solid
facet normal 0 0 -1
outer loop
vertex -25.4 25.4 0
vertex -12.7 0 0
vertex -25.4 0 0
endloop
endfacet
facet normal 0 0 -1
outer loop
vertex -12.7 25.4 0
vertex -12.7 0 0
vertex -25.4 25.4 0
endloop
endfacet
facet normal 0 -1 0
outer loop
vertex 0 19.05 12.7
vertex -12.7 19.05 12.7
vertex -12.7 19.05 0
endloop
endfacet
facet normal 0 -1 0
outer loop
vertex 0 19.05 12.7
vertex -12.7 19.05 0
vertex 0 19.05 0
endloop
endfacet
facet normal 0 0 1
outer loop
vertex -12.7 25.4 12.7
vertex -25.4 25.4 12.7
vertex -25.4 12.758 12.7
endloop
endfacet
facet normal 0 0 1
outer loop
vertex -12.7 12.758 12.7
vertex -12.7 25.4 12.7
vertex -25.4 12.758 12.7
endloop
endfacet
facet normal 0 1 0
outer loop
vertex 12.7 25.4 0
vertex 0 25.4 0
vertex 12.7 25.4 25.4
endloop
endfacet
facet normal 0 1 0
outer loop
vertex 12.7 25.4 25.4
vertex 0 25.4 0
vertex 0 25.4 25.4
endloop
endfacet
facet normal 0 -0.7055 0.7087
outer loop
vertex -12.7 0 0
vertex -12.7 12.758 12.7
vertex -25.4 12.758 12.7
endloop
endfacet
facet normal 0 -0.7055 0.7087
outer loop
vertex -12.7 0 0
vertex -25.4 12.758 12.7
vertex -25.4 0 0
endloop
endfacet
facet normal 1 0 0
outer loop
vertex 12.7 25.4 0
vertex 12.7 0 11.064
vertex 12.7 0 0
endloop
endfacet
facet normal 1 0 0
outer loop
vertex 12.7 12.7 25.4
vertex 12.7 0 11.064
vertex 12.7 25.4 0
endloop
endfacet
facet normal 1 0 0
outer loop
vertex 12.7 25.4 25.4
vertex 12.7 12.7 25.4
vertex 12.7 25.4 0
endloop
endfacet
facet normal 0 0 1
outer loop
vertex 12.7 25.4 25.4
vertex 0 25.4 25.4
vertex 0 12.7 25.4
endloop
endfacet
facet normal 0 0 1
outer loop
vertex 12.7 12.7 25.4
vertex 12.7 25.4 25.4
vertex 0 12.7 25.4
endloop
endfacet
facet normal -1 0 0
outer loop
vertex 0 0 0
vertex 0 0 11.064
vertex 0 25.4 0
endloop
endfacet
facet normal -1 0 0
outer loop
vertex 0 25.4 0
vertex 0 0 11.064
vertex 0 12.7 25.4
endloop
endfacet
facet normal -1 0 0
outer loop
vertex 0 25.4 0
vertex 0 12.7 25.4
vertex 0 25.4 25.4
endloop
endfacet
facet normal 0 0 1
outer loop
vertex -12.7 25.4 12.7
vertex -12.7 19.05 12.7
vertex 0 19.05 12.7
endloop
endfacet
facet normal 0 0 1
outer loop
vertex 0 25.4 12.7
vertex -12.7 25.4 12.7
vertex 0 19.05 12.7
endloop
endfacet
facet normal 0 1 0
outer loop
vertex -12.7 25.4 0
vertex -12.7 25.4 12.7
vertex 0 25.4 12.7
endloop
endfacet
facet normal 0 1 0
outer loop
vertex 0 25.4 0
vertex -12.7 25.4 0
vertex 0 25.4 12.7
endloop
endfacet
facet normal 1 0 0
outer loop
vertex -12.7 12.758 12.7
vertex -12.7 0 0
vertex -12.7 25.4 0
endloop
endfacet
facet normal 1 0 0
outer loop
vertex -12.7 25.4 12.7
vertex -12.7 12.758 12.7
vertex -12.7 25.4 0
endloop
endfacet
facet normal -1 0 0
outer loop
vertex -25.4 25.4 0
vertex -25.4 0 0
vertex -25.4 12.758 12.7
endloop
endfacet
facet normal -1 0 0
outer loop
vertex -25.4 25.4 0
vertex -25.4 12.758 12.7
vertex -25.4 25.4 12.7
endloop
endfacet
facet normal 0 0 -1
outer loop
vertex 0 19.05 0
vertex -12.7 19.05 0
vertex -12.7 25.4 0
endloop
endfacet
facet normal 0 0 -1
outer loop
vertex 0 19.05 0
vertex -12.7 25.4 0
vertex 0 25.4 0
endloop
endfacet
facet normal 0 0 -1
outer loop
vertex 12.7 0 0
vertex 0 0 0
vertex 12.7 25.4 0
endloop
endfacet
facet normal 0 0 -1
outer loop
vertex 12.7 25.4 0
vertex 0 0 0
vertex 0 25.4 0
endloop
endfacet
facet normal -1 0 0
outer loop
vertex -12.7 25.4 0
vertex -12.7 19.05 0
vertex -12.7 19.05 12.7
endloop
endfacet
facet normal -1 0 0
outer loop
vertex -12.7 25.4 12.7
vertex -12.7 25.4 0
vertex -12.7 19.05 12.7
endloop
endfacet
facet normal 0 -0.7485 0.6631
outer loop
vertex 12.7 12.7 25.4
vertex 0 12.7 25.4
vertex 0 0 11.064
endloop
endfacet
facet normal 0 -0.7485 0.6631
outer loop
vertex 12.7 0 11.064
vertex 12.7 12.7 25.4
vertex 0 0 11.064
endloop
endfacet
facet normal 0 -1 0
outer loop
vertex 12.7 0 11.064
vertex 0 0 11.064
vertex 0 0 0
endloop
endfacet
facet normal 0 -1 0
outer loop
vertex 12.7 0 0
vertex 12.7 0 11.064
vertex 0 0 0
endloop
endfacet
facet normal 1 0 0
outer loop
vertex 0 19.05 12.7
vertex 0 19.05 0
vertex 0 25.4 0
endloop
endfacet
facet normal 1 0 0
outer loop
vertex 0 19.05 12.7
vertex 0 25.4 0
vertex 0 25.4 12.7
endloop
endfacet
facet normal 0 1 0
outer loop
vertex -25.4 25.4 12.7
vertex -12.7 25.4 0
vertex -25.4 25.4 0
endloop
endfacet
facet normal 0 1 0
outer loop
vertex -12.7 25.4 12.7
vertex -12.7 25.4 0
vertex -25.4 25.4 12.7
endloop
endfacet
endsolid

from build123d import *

# Parameters (mm, degrees)
F1_DEPTH = 12.7
F3_START = -12.7
F3_DEPTH = 12.7
F5_START = -19.05
F4_W     = 12.7
F4_H     = 12.7
F5_DEPTH = 6.35


with BuildPart() as f1:
    # F0 (on Right) → F1 (new body)
    with BuildSketch(Plane.YZ):
        Polygon((0, 11.0641479859), (0, 0), (25.4, 0), (25.4, 25.4), (12.7, 25.4), align=None)
    extrude(amount=F1_DEPTH)


with BuildPart() as f3:
    # F2 (on Right) → F3 (new body)
    with BuildSketch(Plane.YZ.offset(F3_START)):
        Polygon((0, 0), (25.4, 0), (25.4, 12.7), (12.75798229, 12.7), align=None)
    extrude(amount=-F3_DEPTH)


with BuildPart() as f5:
    # F4 (on Front) → F5 (new body)
    with BuildSketch(Plane.XZ.offset(F5_START)):
        with Locations((-6.35, 6.35)):
            Rectangle(F4_W, F4_H)
    extrude(amount=-F5_DEPTH)


solid = Compound([f1.part, f3.part, f5.part])
